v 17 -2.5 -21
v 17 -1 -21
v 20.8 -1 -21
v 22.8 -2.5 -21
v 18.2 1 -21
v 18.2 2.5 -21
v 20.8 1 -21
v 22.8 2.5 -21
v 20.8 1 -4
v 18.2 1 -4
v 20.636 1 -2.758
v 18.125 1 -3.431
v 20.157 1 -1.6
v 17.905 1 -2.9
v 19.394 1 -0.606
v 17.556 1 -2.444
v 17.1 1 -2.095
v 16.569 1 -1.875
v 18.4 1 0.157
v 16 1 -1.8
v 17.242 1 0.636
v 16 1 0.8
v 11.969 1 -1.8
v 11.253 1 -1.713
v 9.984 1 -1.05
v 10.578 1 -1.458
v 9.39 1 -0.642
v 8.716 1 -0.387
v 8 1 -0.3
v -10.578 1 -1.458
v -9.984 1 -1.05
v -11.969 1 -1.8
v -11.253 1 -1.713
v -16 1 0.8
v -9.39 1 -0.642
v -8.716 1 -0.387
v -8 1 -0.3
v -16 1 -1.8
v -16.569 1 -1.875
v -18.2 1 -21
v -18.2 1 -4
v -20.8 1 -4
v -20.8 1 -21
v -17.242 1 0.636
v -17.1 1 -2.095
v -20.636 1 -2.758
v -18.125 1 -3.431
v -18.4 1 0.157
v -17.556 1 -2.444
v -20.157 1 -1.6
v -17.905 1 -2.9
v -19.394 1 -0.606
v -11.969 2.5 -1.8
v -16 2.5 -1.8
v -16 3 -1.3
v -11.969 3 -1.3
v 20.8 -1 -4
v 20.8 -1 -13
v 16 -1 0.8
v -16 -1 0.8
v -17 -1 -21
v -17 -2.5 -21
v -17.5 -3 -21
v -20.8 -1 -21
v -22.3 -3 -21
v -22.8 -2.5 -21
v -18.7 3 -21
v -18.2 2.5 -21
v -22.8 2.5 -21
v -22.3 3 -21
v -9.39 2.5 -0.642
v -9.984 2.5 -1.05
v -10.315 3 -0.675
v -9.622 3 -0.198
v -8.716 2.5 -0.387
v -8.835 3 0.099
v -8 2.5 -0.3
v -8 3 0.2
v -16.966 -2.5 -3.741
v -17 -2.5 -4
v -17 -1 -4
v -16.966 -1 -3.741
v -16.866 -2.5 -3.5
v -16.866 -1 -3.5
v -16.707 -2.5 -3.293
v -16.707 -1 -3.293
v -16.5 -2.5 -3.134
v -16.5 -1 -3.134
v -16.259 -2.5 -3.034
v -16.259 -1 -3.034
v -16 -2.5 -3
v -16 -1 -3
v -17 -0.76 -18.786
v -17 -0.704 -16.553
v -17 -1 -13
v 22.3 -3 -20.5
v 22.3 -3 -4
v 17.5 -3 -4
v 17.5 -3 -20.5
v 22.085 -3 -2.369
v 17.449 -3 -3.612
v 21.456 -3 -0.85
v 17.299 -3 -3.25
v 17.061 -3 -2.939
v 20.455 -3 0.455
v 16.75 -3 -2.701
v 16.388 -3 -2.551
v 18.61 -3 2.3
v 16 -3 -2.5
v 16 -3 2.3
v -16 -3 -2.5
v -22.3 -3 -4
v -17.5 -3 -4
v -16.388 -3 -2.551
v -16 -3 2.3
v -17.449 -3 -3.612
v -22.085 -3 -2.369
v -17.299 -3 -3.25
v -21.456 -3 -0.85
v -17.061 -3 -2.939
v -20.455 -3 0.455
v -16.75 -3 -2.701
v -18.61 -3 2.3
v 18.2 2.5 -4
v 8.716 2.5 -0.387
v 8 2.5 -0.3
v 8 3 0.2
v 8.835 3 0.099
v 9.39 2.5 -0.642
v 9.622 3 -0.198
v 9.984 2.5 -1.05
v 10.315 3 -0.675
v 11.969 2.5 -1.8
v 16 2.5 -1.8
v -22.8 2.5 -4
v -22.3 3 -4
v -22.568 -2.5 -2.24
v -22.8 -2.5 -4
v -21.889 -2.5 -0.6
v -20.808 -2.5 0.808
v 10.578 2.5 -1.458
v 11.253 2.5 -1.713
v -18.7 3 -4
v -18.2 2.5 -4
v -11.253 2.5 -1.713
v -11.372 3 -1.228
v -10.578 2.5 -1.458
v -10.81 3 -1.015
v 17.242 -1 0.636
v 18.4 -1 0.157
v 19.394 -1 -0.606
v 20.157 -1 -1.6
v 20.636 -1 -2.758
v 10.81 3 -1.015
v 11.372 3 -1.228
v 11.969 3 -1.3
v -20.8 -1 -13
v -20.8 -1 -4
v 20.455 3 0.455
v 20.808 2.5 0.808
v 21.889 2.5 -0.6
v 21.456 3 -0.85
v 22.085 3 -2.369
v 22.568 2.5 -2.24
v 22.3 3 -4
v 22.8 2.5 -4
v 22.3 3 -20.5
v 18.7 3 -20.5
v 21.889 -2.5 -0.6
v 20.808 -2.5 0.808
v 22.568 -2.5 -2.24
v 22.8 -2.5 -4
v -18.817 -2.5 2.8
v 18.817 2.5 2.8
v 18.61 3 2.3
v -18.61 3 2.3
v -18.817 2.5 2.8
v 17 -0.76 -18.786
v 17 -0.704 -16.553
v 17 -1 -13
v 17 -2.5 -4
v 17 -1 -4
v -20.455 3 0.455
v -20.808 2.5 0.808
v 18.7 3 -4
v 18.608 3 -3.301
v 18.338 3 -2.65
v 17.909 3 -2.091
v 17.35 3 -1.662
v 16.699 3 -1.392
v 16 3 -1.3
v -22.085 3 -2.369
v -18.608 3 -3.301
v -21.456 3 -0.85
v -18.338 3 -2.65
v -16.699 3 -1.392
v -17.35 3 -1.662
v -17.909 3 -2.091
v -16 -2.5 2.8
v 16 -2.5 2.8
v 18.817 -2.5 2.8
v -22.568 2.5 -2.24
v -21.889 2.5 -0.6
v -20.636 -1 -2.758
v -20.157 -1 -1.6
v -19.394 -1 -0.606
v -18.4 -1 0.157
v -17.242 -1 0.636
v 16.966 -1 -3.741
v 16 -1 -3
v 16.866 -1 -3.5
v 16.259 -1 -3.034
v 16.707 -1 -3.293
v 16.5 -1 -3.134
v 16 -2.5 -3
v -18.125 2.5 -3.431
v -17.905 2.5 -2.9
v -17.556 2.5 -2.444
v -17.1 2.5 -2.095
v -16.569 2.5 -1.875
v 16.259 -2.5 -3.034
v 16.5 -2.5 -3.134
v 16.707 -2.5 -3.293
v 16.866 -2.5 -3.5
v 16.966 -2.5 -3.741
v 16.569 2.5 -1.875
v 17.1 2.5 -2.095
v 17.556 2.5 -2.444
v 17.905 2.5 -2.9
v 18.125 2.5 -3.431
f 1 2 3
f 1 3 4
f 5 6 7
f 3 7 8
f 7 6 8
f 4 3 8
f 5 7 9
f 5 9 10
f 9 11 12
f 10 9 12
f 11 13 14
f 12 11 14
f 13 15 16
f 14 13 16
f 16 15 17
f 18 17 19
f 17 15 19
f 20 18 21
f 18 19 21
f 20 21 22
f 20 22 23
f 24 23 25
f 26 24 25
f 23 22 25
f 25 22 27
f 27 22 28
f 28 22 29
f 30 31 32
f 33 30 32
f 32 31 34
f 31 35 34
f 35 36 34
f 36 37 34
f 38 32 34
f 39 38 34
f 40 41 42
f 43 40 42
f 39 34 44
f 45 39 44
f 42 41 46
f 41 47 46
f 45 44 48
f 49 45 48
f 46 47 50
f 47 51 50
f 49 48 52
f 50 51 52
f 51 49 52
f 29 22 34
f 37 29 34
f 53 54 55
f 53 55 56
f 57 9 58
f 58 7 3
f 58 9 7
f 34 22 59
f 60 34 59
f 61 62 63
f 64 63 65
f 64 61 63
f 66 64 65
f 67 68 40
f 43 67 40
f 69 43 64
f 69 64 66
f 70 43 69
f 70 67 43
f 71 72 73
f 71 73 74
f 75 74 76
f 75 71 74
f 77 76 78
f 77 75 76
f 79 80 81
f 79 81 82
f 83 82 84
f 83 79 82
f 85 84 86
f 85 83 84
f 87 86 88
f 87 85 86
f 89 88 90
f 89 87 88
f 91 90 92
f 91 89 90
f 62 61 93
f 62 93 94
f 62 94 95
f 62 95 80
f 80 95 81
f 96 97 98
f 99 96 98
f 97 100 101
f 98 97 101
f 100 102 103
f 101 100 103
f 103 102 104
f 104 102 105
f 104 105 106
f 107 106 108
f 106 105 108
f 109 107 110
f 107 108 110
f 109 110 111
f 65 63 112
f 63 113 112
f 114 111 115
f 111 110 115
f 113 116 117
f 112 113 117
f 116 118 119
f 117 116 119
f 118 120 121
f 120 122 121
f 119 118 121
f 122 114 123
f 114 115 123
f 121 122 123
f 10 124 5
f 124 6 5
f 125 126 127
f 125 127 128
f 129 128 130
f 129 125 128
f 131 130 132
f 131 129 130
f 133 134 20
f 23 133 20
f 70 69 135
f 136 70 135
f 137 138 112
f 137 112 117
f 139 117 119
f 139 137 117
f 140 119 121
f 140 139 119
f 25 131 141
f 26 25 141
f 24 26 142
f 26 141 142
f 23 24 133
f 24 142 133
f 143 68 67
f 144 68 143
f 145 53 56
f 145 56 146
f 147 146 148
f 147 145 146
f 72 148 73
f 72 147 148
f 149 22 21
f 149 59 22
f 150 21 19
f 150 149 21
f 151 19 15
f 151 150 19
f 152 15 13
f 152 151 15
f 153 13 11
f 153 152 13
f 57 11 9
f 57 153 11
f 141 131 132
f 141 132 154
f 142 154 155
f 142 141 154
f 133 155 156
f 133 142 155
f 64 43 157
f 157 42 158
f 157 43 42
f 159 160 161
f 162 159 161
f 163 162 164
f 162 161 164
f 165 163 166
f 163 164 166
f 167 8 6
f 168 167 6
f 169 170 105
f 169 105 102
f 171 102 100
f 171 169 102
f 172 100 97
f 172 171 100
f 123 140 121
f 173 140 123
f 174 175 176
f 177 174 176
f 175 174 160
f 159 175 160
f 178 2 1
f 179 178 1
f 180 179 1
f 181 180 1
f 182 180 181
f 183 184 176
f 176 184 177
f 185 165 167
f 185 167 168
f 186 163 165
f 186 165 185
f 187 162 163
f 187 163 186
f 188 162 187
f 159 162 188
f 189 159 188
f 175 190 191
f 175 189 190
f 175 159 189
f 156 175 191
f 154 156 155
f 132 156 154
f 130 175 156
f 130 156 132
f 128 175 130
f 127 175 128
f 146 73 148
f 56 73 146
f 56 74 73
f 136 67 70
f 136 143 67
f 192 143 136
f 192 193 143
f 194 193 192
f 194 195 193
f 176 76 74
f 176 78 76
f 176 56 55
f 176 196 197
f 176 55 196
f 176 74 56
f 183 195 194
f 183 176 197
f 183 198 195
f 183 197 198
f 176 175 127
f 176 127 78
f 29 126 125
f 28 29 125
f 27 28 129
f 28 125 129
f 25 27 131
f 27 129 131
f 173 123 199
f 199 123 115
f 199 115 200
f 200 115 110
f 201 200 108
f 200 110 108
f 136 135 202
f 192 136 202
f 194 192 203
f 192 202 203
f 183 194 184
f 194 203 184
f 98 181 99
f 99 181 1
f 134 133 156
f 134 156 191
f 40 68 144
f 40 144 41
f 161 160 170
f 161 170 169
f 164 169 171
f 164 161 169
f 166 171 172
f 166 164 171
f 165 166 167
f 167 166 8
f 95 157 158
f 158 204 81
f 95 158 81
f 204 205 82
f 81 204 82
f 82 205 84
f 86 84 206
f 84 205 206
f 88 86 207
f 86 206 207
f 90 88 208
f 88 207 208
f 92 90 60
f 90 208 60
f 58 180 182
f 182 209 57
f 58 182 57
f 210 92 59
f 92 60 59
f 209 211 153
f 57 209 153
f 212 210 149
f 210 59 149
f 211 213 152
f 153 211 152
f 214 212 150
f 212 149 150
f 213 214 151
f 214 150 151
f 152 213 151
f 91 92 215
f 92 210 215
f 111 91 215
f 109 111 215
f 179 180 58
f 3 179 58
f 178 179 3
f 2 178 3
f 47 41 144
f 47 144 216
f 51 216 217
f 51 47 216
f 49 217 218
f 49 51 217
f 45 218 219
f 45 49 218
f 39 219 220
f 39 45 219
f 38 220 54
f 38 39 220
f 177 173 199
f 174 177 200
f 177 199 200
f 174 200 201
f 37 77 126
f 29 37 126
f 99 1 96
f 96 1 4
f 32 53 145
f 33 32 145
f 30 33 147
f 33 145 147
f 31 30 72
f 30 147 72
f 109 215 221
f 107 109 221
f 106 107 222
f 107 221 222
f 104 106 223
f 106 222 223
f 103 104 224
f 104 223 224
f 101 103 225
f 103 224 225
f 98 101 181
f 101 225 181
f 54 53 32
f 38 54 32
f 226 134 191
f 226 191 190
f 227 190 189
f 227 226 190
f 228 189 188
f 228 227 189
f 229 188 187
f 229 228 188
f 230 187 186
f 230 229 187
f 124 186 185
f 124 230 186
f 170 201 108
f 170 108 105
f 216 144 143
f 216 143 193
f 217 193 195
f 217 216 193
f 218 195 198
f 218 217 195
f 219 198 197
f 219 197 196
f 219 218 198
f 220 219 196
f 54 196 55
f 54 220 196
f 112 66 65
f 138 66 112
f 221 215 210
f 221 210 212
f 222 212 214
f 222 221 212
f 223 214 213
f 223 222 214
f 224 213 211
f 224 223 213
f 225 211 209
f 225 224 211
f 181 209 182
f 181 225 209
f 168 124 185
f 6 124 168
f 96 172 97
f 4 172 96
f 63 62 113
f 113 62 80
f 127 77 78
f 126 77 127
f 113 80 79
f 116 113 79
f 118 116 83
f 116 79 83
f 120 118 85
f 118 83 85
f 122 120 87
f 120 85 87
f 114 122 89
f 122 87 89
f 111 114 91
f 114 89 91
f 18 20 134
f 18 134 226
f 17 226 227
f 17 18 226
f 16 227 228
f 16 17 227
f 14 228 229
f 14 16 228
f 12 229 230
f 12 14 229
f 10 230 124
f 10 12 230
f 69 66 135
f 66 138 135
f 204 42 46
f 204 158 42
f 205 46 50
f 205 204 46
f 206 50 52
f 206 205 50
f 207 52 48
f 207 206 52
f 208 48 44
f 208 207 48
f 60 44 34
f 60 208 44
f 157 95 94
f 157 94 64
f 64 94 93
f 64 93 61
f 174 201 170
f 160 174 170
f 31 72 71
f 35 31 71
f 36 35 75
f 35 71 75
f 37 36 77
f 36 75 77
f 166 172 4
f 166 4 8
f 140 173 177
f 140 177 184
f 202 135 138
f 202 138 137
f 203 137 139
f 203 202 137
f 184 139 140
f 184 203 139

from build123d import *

# Parameters (mm, degrees)
BOSS_EXTRUDE1_DEPTH = 6
CUT_EXTRUDE1_REACH  = 33.573
CHAMFER2_SIZE       = 0.5


with BuildPart() as part:
    # Sweep3: sweep along a path in Sketch1
    with BuildLine(Plane(origin=(0, 0, 0), x_dir=(1, 0, 0), z_dir=(0, 1, 0))) as sweep3_path:
        Line((-20, 21), (-20, 4))
        ThreePointArc((-20, 4), (-18.828427125, 1.171572875), (-16, 0))
        Line((-16, 0), (16, 0))
        ThreePointArc((16, 0), (18.828427125, 1.171572875), (20, 4))
        Line((20, 4), (20, 21))
    # Sketch2 → Sweep3 (sweep)
    with BuildSketch(Plane.XY.offset(-21)):
        Polygon((18.2, 1), (18.2, 3), (22.8, 3), (22.8, -3), (17, -3), (17, -1), (20.8, -1), (20.8, 1), align=None)
    sweep(path=sweep3_path.line)

    # Sketch5 → Boss-Extrude1 (add, through all)
    with BuildSketch(Plane.XZ.offset(3)):
        Polygon((-16, 2.8), (-18.816652224, 2.8), (-20.808326112, 0.808326112), align=None)
    boss_extrude1 = extrude(amount=-BOSS_EXTRUDE1_DEPTH)

    # Mirror2: Boss-Extrude1 across plane
    add(boss_extrude1.mirror(Plane(origin=(0, 0, 0), x_dir=(0, 0, 1), z_dir=(1, 0, 0))))

    # Sketch6 → Cut-Extrude1 (cut, up to next)
    with BuildSketch(Plane(origin=(0, 3, 0), x_dir=(1, 0, 0), z_dir=(0, 1, 0)), mode=Mode.PRIVATE) as cut_extrude1_sk1:
        with BuildLine():
            Line((-8, 0.3), (8, 0.3))
            ThreePointArc((8, 0.3), (9.060660172, 0.49375696), (9.984313483, 1.05))
            ThreePointArc((9.984313483, 1.05), (10.907966795, 1.60624304), (11.968626967, 1.8))
            Line((11.968626967, 1.8), (-11.968626967, 1.8))
            ThreePointArc((-11.968626967, 1.8), (-10.907966795, 1.60624304), (-9.984313483, 1.05))
            ThreePointArc((-9.984313483, 1.05), (-9.060660172, 0.49375696), (-8, 0.3))
        make_face()
    cut_extrude1_tool1 = extrude(cut_extrude1_sk1.sketch, amount=-CUT_EXTRUDE1_REACH, mode=Mode.PRIVATE) & part.part
    add(cut_extrude1_tool1.solids().sort_by_distance((0, 3, -1.083194))[0], mode=Mode.SUBTRACT)

    # Chamfer2
    chamfer2_edges = [part.edges().sort_by_distance(p)[0] for p in [
        (13.984313483, 3, -1.8),
        (-10.907966795, 3, -1.60624304),
        (-9.060660172, 3, -0.49375696),
        (0, 3, -0.3),
        (9.060660172, 3, -0.49375696),
        (10.907966795, 3, -1.60624304),
        (0, -3, -3),
        (0, -3, 2.8),
        (0, 3, 2.8),
        (-13.984313483, 3, -1.8),
        (16.707106781, -3, -3.292893219),
        (17.555634919, 3, -2.444365081),
        (17, -3, -12.5),
        (19.9, -3, -21),
        (22.8, -3, -12.5),
        (22.8, 3, -12.5),
        (20.5, 3, -21),
        (18.2, 3, -12.5),
        (-17, -3, -12.5),
        (-22.8, -3, -12.5),
        (-22.8, 3, -12.5),
        (-18.2, 3, -12.5),
        (-16.707106781, -3, -3.292893219),
        (-22.282380821, -3, -1.39775266),
        (-19.812489168, 3, 1.804163056),
        (0, 3, 2.8),
        (0, -3, 2.8),
        (-19.812489168, -3, 1.804163056),
        (-22.282380821, 3, -1.39775266),
        (-17.555634919, 3, -2.444365081),
        (22.282380821, 3, -1.39775266),
        (22.282380821, -3, -1.39775266),
        (0, -3, 2.8),
        (19.812489168, -3, 1.804163056),
        (19.812489168, 3, 1.804163056),
        (0, 3, 2.8),
    ]]
    chamfer(chamfer2_edges, length=CHAMFER2_SIZE)

    # Sketch4 for Loft1 → Loft1 section 0
    with BuildSketch(Plane.ZY.offset(-20.8)):
        with BuildLine():
            Line((-21, -1), (-13, -1))
            # circular arc as an exact rational Bezier (weights 1, cos(half-angle), 1)
            Bezier((-13, -1), (-17, -0.899984373), (-21, -1), weights=[1, 0.999687549, 1])
        make_face()
    # Sketch3 for Loft1 → Loft1 section 1
    with BuildSketch(Plane.ZY.offset(-17)):
        with BuildLine():
            Line((-21, -1), (-13, -1))
            Bezier((-13, -1), (-17, -0.396605908), (-21, -1), weights=[1, 0.988812927, 1])
        make_face()
    loft1 = loft()

    # Mirror1: Loft1 across plane
    add(loft1.mirror(Plane(origin=(0, 0, 0), x_dir=(0, 0, 1), z_dir=(1, 0, 0))))


solid = part.part
